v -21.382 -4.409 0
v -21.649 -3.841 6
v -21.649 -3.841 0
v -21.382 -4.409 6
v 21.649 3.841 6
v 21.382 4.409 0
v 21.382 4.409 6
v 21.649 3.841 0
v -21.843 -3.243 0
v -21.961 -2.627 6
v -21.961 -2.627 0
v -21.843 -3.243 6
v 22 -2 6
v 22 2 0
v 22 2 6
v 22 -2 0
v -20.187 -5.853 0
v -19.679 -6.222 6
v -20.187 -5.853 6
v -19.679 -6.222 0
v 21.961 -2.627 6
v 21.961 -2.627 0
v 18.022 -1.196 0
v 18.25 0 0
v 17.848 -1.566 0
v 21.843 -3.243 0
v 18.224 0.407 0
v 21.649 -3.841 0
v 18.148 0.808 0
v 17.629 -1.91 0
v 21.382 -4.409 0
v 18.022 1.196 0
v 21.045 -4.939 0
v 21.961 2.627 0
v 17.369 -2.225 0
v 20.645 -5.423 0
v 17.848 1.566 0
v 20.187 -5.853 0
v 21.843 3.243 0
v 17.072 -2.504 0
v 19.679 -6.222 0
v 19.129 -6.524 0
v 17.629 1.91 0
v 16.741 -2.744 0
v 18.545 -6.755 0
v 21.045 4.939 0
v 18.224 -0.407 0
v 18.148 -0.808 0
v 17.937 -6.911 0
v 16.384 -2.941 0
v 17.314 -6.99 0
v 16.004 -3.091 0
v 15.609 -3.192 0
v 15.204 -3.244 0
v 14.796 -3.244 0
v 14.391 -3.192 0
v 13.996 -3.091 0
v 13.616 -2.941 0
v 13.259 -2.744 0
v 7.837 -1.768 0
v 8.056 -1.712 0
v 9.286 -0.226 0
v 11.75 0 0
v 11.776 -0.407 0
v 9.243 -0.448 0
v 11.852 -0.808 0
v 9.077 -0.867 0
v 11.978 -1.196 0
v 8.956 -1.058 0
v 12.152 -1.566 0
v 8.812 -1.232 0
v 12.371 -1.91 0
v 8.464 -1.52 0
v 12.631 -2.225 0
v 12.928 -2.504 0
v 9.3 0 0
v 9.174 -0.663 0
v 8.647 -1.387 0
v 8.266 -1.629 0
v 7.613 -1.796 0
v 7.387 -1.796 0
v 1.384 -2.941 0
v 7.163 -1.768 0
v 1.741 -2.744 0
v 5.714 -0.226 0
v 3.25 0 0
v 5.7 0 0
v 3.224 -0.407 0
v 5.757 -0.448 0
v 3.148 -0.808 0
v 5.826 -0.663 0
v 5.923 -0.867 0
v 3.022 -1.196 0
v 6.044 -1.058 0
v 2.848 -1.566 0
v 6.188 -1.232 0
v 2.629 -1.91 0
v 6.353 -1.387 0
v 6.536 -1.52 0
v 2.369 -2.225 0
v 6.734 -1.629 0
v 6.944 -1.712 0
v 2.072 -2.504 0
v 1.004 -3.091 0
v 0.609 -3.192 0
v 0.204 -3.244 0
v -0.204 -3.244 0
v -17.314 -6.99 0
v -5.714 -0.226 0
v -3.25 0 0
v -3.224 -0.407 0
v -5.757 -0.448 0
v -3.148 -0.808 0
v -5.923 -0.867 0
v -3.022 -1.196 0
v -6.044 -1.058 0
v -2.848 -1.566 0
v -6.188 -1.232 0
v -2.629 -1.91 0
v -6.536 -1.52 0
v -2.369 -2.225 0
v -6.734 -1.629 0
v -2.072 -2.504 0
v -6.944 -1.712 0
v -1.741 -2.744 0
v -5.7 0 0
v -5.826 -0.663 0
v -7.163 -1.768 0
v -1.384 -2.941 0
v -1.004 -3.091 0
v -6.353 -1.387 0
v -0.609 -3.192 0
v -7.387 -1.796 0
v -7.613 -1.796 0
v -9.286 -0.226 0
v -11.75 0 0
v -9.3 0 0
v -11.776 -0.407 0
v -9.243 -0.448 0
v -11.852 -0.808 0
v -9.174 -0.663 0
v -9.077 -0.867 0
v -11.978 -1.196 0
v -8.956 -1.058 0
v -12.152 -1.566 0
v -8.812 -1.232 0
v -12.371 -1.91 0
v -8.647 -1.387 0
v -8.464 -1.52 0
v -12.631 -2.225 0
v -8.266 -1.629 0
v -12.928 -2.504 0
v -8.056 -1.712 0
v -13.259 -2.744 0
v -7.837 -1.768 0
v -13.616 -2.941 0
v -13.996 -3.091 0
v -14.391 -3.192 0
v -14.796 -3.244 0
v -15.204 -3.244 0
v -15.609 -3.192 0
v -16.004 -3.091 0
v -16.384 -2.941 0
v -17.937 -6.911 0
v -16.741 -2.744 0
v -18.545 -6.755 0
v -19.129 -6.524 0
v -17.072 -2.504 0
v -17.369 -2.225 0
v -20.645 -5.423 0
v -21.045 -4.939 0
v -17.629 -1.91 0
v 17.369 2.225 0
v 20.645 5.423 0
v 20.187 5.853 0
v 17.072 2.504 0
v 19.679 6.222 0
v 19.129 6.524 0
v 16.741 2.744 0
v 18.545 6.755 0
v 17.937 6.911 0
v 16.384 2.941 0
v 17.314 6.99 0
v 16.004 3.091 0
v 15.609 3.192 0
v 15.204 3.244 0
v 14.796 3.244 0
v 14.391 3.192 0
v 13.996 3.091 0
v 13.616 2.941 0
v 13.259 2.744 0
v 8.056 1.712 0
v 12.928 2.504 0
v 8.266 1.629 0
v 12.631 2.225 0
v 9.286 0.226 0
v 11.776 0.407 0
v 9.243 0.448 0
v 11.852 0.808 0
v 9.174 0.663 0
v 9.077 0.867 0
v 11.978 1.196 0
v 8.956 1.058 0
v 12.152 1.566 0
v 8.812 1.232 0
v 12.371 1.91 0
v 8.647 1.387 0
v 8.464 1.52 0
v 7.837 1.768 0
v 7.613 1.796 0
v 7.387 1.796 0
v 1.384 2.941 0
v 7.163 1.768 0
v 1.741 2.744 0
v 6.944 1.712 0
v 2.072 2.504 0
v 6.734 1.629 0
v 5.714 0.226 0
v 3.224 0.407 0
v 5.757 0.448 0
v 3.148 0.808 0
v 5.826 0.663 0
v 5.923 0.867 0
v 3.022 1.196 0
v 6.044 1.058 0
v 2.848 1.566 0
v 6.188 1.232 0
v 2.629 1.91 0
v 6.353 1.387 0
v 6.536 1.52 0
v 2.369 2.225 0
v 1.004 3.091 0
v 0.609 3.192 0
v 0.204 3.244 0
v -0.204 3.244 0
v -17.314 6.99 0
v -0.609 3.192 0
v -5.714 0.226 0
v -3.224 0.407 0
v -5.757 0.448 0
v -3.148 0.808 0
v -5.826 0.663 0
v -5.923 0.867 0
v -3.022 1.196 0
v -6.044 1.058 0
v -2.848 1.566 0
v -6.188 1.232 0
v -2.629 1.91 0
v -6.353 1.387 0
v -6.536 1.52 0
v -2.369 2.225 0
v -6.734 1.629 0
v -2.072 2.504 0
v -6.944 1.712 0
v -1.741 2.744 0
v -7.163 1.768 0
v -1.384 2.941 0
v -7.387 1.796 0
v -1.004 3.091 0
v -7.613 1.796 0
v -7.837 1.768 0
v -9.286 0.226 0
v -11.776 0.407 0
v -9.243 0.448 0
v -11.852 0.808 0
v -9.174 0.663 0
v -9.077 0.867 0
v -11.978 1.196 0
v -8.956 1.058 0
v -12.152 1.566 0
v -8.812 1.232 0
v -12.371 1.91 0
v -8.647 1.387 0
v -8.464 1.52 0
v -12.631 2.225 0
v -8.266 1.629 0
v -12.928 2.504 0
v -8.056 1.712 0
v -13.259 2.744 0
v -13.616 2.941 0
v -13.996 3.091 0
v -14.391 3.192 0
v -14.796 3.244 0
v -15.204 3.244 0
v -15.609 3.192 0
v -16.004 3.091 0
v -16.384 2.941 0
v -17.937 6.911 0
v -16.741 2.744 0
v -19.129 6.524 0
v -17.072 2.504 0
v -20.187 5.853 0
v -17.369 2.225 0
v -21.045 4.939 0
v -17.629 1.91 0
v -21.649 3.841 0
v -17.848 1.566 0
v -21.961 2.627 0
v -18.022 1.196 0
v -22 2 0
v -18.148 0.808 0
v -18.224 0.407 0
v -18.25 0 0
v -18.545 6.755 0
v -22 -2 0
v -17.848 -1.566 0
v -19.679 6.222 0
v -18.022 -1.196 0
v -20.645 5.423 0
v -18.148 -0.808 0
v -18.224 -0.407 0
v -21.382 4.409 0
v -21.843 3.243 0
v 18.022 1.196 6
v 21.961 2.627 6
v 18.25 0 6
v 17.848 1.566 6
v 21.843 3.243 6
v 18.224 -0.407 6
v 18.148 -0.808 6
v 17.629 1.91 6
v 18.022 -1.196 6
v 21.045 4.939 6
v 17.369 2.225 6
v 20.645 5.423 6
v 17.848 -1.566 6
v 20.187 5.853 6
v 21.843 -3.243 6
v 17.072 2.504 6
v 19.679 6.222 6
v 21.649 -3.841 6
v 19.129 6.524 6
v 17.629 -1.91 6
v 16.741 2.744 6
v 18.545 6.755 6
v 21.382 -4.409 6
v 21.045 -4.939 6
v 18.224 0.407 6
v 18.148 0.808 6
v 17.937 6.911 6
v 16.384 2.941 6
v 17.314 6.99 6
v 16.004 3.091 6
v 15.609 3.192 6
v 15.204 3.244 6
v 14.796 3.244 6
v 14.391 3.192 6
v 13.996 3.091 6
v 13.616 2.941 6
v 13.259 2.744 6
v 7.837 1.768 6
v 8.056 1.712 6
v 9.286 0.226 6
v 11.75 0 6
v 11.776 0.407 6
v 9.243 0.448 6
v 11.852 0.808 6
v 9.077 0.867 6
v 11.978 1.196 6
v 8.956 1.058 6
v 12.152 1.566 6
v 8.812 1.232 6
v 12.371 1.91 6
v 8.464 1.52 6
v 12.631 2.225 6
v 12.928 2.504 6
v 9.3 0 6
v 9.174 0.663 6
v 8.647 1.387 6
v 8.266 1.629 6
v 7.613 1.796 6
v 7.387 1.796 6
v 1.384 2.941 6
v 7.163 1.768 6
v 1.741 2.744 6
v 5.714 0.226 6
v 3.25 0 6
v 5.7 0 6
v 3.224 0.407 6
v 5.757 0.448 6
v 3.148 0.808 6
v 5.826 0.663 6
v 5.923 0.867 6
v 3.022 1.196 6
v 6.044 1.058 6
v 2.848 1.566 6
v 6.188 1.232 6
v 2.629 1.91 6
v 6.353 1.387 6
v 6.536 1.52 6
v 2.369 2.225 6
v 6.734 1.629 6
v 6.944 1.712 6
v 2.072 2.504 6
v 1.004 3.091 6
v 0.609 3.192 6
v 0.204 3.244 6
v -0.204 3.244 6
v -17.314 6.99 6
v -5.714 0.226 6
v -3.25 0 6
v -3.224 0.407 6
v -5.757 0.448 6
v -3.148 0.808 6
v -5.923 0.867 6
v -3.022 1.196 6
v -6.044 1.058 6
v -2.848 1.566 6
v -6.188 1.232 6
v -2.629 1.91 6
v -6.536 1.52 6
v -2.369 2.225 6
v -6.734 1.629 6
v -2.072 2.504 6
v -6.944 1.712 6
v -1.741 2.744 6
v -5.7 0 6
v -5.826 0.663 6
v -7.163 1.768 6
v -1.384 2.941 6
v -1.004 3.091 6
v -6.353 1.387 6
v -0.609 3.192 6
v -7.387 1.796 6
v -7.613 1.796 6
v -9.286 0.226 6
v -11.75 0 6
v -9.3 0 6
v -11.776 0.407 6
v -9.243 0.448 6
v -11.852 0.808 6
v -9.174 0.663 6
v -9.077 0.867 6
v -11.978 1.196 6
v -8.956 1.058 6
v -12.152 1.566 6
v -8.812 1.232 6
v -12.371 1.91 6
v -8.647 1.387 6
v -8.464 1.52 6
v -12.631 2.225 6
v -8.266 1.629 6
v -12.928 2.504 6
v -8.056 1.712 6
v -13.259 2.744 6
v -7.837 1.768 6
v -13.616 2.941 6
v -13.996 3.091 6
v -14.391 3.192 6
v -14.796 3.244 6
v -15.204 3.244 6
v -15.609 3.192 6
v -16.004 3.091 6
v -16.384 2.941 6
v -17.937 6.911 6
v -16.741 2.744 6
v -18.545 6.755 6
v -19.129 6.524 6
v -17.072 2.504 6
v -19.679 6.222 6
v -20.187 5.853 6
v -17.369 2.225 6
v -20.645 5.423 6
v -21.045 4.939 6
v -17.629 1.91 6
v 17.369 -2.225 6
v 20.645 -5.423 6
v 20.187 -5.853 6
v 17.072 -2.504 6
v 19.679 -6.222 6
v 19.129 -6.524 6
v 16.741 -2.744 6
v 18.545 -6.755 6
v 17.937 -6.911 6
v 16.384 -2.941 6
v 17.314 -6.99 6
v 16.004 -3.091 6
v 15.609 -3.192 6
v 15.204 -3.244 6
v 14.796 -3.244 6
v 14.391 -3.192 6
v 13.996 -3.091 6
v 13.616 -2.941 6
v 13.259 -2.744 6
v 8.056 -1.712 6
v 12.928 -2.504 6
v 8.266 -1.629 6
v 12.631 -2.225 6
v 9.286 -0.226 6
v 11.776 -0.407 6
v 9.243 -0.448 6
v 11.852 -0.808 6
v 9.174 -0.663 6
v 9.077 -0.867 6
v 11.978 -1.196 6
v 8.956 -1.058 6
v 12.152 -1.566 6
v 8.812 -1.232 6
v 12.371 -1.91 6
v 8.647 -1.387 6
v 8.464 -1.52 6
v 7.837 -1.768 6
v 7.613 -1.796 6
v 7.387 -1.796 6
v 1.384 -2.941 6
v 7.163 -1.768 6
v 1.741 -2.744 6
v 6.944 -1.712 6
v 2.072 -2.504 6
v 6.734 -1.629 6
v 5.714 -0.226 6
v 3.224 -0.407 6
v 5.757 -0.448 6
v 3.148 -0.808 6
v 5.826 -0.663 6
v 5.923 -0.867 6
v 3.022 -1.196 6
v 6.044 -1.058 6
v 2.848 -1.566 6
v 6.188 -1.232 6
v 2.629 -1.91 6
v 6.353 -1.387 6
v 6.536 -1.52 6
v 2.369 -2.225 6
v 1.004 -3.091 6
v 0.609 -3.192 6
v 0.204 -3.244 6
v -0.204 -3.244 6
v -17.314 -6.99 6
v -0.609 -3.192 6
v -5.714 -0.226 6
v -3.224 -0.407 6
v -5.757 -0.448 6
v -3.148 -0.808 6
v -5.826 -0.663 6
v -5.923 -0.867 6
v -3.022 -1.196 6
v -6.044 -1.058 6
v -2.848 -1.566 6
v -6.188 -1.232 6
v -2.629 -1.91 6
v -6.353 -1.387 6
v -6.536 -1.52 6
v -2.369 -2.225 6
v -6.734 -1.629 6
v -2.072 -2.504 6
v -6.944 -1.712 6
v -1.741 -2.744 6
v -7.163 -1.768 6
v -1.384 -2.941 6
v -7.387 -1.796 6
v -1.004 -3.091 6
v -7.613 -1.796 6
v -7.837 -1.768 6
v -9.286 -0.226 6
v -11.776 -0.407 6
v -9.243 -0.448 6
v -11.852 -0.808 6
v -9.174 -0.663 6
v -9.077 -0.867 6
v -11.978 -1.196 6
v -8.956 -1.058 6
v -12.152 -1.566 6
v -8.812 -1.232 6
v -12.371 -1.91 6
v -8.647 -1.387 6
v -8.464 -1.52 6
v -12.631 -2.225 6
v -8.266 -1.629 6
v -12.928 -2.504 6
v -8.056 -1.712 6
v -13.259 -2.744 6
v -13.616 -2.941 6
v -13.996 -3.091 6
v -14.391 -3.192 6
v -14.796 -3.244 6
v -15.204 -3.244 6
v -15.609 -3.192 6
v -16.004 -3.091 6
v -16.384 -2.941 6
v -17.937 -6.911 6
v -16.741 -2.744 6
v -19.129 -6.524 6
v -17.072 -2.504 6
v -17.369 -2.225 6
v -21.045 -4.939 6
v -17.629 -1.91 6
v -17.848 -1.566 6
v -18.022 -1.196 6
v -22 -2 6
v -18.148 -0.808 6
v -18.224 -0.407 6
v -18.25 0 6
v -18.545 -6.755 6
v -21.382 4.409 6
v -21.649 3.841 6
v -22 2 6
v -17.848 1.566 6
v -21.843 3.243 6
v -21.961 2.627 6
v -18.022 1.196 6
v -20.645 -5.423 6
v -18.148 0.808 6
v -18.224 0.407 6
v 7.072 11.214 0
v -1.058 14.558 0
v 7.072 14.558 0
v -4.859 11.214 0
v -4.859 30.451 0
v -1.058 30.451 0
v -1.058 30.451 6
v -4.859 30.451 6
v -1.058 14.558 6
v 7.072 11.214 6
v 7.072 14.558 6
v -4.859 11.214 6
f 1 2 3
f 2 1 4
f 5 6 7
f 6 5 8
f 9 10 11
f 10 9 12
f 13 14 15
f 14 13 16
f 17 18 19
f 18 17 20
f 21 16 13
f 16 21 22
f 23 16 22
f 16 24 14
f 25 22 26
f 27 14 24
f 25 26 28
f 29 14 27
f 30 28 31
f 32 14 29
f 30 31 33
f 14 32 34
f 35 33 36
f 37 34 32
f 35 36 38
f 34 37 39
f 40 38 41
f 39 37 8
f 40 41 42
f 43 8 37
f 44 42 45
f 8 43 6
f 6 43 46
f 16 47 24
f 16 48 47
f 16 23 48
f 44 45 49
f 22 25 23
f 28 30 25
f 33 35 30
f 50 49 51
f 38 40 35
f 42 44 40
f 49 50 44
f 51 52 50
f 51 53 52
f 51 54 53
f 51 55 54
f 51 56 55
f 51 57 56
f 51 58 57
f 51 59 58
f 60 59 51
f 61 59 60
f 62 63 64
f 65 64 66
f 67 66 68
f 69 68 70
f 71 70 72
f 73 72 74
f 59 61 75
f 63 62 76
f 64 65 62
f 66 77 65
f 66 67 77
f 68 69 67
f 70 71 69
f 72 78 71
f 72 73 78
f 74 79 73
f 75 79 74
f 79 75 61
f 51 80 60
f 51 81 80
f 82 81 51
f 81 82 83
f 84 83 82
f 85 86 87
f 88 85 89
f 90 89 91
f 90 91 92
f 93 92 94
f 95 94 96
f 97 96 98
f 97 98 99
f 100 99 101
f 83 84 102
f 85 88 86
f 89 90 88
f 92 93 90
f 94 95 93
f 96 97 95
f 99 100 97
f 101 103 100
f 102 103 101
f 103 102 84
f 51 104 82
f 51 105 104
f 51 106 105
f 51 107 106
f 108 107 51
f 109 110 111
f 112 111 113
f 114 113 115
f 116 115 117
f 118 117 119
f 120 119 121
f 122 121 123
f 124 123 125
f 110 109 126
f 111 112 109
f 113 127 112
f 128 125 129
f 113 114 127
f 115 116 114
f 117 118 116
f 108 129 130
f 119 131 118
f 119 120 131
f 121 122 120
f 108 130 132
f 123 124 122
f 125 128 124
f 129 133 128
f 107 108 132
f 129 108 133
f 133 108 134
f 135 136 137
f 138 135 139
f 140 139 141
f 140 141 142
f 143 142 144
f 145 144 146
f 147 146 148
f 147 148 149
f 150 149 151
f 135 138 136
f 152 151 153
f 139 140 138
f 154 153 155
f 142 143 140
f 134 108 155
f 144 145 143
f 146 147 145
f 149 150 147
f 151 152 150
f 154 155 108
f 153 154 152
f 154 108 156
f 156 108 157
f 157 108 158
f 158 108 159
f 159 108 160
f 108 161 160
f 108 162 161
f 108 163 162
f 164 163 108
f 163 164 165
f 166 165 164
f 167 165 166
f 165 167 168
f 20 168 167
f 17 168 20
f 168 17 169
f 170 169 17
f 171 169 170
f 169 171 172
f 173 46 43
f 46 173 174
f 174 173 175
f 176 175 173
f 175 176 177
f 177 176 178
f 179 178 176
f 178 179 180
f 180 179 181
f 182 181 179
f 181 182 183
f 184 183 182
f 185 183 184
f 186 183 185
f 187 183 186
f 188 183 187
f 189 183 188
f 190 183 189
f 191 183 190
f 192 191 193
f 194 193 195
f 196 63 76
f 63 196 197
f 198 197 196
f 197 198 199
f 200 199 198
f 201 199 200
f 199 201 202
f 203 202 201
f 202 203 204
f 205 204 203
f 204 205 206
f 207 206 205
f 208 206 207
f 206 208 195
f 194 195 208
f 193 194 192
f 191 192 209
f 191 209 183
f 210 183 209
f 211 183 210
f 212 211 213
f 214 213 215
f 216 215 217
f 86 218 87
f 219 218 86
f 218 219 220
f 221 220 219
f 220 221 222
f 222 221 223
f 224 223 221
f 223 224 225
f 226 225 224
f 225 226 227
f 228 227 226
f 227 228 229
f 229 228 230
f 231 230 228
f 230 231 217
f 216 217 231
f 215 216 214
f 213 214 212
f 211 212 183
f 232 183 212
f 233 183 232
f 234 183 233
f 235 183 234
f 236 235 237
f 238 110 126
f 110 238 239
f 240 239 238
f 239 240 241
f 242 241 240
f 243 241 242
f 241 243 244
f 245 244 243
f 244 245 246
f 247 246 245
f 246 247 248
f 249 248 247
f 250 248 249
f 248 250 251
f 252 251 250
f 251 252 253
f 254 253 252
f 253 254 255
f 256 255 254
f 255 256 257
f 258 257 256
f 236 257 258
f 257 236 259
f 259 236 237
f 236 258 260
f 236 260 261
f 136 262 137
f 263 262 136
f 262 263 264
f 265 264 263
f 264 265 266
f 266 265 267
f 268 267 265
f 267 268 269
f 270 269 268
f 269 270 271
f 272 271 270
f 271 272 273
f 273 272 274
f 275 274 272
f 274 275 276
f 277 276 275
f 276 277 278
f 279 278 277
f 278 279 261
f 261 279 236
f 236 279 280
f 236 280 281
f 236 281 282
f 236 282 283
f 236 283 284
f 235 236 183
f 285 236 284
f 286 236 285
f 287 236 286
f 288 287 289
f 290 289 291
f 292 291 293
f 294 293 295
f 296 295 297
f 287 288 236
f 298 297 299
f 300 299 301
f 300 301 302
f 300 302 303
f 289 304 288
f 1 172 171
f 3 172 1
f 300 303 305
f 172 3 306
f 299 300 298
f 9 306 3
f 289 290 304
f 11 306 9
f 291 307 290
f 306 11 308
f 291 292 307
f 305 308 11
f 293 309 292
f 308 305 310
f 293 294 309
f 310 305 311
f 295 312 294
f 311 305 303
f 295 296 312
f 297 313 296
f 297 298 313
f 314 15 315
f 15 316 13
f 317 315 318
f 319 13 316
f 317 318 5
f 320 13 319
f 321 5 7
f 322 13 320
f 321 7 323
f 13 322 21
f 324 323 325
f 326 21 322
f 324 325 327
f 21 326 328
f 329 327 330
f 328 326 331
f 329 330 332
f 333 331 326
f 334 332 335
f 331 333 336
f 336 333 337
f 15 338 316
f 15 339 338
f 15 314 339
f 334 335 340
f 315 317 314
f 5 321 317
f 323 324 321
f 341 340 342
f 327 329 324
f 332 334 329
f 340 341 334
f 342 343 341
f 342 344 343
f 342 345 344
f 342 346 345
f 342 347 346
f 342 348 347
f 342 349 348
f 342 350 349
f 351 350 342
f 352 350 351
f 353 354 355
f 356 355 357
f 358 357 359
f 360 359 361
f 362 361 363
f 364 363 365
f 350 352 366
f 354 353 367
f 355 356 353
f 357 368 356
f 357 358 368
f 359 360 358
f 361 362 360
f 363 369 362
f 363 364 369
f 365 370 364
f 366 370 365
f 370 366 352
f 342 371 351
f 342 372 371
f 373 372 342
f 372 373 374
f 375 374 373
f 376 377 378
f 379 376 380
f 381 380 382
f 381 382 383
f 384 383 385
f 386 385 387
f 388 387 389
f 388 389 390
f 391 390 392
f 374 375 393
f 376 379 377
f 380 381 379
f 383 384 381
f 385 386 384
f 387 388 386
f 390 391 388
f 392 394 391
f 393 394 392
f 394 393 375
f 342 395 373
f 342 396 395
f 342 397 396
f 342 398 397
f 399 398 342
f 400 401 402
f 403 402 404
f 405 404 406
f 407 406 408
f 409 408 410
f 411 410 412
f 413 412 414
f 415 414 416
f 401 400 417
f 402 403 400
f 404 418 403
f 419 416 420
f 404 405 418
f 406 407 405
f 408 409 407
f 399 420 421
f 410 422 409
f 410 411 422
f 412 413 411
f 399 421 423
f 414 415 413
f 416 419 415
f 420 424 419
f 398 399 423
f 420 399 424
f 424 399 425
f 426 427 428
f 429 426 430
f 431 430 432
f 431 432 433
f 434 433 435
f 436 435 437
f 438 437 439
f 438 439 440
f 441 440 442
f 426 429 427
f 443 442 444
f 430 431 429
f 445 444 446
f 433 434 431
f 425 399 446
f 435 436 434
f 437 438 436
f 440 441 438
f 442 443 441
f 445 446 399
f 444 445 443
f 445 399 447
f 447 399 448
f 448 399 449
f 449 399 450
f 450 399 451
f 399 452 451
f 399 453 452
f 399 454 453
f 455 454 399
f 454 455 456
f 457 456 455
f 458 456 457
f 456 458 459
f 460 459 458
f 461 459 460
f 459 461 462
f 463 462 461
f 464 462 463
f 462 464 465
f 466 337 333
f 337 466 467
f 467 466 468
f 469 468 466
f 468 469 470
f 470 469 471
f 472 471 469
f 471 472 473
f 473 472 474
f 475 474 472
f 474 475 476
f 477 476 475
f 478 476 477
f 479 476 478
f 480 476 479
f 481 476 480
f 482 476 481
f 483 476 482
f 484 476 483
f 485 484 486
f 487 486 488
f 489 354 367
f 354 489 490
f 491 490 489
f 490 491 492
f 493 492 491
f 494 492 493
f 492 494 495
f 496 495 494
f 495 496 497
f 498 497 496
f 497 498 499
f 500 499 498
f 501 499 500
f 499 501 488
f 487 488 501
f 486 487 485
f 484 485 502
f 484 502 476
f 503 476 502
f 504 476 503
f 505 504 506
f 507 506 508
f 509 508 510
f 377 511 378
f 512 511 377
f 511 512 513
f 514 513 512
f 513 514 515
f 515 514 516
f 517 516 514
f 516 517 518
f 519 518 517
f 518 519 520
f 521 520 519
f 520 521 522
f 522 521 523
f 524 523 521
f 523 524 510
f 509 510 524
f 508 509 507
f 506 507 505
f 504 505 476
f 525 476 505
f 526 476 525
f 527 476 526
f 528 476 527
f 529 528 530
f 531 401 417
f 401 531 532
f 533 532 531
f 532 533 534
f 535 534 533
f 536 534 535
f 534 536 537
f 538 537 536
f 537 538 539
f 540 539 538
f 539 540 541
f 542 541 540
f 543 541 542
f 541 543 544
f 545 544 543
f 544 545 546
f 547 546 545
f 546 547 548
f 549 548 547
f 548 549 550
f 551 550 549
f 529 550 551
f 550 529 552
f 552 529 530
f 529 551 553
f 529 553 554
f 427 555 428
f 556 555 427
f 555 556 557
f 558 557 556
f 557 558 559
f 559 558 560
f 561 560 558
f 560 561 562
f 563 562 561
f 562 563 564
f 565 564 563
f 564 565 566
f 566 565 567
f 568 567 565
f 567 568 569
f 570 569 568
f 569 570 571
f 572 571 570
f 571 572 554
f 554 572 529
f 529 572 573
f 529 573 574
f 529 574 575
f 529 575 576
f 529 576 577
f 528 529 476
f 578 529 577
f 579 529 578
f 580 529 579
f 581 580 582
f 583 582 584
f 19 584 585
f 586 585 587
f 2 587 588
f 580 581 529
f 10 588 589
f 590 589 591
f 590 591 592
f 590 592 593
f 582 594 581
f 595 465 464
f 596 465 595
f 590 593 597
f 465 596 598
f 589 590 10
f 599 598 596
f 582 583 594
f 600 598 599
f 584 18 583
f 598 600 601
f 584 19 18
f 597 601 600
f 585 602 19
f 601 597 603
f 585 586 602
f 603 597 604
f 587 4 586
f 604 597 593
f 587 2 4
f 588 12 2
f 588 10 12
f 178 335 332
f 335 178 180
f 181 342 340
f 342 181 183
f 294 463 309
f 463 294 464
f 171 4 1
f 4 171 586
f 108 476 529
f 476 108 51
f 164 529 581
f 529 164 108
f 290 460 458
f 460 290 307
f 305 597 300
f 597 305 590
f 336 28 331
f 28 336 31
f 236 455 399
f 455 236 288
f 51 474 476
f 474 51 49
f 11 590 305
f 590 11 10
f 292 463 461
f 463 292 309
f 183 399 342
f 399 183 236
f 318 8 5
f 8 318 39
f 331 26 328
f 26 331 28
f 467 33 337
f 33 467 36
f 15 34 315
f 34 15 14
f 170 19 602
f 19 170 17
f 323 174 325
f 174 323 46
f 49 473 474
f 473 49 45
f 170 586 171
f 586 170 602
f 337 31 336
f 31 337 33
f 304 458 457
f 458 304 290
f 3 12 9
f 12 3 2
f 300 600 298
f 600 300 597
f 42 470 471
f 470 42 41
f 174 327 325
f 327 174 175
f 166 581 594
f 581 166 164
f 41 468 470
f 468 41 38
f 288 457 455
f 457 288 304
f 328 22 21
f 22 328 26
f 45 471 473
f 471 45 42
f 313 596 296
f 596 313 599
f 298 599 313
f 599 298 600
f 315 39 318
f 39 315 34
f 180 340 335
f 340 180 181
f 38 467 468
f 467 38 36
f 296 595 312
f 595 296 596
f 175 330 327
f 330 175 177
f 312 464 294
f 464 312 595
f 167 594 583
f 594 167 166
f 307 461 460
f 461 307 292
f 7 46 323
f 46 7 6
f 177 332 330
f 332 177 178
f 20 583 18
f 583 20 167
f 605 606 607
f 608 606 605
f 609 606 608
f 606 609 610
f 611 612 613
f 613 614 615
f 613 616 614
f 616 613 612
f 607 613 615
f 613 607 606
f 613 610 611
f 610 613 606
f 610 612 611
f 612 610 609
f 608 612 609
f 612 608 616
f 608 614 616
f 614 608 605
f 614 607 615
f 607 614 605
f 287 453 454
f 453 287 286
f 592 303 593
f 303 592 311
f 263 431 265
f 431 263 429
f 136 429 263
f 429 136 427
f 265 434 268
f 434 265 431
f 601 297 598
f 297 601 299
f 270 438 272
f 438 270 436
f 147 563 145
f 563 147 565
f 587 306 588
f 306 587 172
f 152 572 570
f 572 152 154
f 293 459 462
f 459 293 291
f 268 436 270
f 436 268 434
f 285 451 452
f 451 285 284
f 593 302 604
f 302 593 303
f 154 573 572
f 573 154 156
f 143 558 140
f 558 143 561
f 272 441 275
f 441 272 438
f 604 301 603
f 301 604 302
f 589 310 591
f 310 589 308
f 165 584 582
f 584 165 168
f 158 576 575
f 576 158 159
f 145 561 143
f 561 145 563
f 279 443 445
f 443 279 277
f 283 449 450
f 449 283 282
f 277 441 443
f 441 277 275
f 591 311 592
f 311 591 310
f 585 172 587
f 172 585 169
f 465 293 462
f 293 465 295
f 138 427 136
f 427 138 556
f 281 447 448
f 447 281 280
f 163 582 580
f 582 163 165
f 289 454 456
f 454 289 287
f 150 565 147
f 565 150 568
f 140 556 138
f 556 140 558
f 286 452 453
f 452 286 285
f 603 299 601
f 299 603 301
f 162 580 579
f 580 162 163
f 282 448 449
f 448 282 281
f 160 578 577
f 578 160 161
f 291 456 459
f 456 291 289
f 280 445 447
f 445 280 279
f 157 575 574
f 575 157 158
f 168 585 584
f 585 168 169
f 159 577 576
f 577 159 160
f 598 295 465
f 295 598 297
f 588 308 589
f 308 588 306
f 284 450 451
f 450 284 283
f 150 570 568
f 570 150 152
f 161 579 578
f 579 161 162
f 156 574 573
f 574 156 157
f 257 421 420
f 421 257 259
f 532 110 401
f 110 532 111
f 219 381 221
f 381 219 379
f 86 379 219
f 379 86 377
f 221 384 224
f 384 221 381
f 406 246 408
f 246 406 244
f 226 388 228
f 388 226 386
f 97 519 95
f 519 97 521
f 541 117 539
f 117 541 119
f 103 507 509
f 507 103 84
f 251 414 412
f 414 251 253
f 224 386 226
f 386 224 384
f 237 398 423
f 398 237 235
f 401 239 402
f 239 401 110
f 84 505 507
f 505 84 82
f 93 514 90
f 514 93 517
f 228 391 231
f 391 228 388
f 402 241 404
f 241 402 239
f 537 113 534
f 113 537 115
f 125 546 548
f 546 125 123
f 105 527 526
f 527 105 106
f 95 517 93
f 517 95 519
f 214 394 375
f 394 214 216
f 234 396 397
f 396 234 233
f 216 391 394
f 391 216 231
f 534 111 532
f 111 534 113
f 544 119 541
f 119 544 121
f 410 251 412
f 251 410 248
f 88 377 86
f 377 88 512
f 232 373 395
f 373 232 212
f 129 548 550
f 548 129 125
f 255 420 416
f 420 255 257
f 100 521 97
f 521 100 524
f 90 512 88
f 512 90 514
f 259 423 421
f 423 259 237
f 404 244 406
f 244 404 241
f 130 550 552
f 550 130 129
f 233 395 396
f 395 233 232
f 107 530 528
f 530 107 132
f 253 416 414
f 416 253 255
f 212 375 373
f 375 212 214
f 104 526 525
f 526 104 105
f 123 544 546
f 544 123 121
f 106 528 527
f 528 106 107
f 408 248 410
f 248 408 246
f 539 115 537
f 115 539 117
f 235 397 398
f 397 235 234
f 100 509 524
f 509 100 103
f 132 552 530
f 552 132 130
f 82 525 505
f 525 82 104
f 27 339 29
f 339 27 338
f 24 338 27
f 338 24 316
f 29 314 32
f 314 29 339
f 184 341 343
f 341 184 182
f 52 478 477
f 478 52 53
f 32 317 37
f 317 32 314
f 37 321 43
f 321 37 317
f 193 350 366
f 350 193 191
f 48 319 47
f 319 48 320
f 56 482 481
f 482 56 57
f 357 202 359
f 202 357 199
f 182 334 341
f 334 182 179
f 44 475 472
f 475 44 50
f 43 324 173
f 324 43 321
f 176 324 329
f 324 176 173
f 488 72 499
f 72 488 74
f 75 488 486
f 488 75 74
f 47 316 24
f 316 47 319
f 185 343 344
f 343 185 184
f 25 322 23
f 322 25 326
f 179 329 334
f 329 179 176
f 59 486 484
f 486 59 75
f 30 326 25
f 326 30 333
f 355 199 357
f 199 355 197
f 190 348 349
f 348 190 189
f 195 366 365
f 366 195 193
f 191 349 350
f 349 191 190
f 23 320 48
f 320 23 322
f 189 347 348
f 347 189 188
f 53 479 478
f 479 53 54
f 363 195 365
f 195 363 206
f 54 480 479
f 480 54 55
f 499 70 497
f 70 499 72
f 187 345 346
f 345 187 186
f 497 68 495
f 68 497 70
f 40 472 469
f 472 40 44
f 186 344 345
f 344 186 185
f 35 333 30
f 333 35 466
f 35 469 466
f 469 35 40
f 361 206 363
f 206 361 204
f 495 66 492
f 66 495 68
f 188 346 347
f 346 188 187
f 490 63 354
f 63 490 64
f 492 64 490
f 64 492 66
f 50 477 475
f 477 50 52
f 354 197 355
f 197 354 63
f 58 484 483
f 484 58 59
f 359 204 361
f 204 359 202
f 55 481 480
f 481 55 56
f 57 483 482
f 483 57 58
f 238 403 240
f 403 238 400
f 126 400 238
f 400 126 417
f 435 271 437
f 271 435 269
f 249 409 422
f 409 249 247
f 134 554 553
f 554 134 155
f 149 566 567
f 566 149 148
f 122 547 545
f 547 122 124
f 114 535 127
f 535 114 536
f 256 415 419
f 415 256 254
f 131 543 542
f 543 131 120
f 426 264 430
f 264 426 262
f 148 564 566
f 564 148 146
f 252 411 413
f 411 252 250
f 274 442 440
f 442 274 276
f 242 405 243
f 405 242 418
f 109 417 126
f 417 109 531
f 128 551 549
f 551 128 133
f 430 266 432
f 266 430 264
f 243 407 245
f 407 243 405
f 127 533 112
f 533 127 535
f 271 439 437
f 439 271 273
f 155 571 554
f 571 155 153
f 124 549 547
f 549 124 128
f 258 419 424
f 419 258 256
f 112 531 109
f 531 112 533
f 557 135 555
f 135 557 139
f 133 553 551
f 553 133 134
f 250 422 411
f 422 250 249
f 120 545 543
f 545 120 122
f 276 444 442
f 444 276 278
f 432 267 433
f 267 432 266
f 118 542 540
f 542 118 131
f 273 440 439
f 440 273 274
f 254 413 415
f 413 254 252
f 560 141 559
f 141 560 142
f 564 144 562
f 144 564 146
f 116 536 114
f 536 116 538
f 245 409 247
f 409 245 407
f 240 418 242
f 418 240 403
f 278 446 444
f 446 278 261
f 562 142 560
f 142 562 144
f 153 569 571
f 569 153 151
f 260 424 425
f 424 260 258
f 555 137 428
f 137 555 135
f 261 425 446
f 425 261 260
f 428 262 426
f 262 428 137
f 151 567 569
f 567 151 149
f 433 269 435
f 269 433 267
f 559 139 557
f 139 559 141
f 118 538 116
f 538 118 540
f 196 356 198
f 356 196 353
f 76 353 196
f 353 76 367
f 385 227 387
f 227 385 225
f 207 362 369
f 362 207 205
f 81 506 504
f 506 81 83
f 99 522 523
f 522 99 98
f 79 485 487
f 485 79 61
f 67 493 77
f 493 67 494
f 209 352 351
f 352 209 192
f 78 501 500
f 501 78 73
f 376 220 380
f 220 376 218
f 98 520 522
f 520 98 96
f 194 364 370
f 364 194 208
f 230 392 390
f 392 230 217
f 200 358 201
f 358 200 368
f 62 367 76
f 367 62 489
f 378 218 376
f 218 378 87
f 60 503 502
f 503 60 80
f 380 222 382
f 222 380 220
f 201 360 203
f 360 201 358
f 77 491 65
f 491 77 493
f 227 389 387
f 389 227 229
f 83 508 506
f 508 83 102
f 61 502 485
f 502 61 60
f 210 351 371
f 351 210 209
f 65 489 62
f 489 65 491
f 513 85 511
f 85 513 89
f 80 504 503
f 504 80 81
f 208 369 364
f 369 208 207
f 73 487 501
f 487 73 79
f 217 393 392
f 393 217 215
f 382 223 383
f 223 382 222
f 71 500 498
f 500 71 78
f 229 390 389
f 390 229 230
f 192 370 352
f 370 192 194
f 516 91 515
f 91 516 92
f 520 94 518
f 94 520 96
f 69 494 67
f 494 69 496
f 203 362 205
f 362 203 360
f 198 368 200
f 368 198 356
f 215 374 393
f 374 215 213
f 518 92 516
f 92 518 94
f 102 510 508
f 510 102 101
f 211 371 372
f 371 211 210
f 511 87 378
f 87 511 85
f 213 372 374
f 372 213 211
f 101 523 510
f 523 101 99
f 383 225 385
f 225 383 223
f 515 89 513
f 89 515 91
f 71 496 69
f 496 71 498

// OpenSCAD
$fn = 50;


difference() {
	union() {
		hull() {
			translate(v = [-17.0000000000, 2.0000000000, 0]) {
				cylinder(h = 6, r = 5);
			}
			translate(v = [17.0000000000, 2.0000000000, 0]) {
				cylinder(h = 6, r = 5);
			}
			translate(v = [-17.0000000000, -2.0000000000, 0]) {
				cylinder(h = 6, r = 5);
			}
			translate(v = [17.0000000000, -2.0000000000, 0]) {
				cylinder(h = 6, r = 5);
			}
		}
		translate(v = [0, 30.0000000000, 0]) {
			linear_extrude(height = 6) {
				text(font = "DejaVu Sans Mono:style=Bold", halign = "center", size = 19.0000000000, text = "L", valign = "top");
			}
		}
	}
	union() {
		translate(v = [-15.0000000000, 0.0000000000, 0]) {
			translate(v = [0, 0, -100]) {
				cylinder(h = 200, r = 3.2500000000);
			}
		}
		translate(v = [0, 0, -100]) {
			cylinder(h = 200, r = 3.2500000000);
		}
		translate(v = [15.0000000000, 0.0000000000, 0]) {
			translate(v = [0, 0, -100]) {
				cylinder(h = 200, r = 3.2500000000);
			}
		}
		translate(v = [-15.0000000000, 0.0000000000, 0]) {
			translate(v = [0, 0, -100]) {
				cylinder(h = 200, r = 1.8000000000);
			}
		}
		translate(v = [-7.5000000000, 0.0000000000, 0]) {
			translate(v = [0, 0, -100]) {
				cylinder(h = 200, r = 1.8000000000);
			}
		}
		translate(v = [0, 0, -100]) {
			cylinder(h = 200, r = 1.8000000000);
		}
		translate(v = [7.5000000000, 0.0000000000, 0]) {
			translate(v = [0, 0, -100]) {
				cylinder(h = 200, r = 1.8000000000);
			}
		}
		translate(v = [15.0000000000, 0.0000000000, 0]) {
			translate(v = [0, 0, -100]) {
				cylinder(h = 200, r = 1.8000000000);
			}
		}
	}
}
